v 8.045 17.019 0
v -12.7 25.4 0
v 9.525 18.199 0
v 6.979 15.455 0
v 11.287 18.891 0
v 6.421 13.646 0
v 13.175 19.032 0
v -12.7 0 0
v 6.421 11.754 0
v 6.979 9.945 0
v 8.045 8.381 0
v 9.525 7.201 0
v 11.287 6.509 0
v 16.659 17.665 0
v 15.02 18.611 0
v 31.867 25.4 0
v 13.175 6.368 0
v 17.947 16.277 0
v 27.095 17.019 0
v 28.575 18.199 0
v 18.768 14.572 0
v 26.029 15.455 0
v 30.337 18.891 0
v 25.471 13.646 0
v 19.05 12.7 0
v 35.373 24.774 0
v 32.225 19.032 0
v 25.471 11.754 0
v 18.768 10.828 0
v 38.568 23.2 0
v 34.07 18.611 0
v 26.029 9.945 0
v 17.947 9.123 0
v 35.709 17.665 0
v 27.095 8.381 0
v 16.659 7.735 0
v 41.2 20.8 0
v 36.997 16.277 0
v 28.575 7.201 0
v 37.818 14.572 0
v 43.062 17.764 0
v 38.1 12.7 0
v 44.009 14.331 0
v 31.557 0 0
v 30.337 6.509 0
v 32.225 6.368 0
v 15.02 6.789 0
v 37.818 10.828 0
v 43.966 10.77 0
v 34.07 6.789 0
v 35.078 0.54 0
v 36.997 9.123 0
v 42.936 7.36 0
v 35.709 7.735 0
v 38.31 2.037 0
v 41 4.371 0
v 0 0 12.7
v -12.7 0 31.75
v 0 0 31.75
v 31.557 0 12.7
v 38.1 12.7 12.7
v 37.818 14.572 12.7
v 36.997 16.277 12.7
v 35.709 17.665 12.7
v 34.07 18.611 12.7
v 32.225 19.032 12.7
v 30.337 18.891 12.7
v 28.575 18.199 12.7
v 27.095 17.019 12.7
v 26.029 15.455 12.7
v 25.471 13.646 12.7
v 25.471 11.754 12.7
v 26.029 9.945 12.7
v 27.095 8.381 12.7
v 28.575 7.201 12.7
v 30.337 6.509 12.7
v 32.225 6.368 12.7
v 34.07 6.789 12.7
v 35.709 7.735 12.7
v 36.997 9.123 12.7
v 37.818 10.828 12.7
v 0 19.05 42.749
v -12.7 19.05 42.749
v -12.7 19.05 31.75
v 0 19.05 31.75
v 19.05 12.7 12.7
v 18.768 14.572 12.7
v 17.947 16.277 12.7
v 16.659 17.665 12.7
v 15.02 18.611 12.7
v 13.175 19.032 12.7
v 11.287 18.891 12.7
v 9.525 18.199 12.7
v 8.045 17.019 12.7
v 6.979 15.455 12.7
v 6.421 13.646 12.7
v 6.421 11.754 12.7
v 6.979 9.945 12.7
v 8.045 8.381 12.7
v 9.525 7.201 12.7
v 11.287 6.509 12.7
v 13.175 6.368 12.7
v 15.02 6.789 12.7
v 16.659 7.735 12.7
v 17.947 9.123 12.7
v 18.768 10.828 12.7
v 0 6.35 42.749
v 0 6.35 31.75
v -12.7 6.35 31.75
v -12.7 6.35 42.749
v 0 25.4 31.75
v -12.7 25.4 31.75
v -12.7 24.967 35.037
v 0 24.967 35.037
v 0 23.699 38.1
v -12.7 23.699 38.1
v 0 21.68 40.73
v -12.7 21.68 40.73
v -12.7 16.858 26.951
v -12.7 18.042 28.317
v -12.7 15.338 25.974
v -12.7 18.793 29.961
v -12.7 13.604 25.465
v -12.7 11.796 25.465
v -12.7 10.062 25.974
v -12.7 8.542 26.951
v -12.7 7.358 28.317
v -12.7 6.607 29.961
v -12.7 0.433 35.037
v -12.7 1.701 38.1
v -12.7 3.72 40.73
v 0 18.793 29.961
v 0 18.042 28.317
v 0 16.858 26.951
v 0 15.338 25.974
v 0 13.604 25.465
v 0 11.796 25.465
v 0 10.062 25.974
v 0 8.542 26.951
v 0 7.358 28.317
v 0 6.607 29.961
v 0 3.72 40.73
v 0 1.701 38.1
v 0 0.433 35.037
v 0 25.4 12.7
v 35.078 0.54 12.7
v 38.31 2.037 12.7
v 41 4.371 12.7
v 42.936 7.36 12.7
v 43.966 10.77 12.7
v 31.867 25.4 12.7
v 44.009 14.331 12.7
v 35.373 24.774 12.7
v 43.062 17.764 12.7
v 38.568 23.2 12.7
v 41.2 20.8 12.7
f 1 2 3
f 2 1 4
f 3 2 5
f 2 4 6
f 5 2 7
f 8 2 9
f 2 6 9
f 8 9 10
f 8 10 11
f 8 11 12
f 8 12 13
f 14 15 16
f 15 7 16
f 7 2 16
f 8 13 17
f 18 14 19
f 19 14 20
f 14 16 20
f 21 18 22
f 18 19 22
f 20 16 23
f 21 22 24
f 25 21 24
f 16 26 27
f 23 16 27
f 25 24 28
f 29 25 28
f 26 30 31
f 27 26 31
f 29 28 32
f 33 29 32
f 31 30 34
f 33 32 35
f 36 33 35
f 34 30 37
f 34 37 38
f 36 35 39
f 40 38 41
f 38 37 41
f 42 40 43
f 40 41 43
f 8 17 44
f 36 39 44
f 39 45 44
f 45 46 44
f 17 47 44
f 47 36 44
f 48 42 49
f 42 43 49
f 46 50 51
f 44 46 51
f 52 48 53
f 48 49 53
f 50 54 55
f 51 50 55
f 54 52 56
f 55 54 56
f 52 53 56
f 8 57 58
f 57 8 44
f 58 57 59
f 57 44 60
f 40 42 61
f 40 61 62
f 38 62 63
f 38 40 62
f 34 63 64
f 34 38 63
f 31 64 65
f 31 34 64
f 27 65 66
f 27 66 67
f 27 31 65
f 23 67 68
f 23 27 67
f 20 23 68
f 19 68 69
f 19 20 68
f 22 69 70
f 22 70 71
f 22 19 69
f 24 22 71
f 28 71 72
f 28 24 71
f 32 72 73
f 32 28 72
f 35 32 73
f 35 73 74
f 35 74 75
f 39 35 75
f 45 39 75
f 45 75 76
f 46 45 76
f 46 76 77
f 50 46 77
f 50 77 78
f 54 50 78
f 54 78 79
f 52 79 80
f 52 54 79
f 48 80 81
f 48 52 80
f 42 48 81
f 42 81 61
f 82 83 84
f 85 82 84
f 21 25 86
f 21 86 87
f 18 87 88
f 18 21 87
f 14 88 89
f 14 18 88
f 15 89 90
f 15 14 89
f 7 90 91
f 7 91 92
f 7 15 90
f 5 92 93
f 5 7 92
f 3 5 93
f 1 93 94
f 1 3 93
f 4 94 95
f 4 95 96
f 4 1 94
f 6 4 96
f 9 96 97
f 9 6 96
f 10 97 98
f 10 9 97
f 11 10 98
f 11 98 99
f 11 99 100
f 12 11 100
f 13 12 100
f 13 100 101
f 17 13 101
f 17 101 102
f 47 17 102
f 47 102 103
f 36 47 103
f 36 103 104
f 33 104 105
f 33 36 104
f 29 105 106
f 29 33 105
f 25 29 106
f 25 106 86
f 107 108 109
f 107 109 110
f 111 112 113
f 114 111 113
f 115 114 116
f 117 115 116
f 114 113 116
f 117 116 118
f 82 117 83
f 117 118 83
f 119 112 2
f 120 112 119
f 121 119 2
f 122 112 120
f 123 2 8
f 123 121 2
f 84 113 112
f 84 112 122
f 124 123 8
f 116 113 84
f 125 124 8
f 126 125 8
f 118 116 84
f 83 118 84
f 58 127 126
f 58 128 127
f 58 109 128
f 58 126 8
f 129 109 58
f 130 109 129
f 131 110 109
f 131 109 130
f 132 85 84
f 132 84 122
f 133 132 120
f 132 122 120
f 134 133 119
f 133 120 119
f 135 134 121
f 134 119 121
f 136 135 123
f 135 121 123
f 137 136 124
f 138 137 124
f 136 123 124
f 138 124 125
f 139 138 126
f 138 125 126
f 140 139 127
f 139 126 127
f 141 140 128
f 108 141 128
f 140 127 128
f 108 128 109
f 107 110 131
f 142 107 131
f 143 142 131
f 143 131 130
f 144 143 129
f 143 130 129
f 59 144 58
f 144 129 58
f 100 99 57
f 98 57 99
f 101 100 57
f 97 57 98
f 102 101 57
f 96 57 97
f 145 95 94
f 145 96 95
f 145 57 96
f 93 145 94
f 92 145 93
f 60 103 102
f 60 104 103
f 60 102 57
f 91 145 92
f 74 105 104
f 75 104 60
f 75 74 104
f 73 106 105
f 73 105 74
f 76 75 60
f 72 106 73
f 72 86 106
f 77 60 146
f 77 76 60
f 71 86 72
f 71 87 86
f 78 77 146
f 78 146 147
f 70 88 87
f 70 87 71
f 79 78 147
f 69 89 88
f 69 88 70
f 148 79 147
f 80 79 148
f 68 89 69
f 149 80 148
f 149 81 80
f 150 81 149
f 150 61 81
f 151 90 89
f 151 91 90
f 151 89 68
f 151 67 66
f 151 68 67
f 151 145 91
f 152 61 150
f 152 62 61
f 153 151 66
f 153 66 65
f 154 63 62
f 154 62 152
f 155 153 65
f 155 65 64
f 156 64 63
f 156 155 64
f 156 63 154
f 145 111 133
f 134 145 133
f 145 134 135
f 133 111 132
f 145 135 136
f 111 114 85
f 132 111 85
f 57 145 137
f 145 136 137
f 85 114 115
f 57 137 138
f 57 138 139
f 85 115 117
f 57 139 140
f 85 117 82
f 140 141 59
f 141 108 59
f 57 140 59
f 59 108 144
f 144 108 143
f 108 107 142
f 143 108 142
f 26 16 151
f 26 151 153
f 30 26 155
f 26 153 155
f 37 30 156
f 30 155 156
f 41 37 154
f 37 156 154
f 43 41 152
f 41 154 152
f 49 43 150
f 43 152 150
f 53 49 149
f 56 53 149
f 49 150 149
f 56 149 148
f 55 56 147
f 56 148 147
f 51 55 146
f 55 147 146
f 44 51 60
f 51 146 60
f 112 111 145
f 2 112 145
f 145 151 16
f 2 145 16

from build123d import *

# Parameters (mm, degrees)
F0_R     = 6.35
F1_DEPTH = 12.7
F3_DEPTH = 12.7
F4_W     = 25.4
F4_H     = 31.75
F4_H_2   = 12.7
F5_DEPTH = 12.7
F7_DEPTH = 12.7
F9_DEPTH = 12.7


with BuildPart() as f1:
    # F0 (on Top) → F1 (new body)
    with BuildSketch(Plane.XY):
        with BuildLine():
            Line((31.75, 25.4), (0, 25.4))
            Line((0, 25.4), (0, 0))
            Line((0, 0), (31.75, 0))
            ThreePointArc((31.75, 0), (44.304303, 12.7), (31.75, 25.4))
        make_face()
        with Locations((12.7, 12.7)):
            Circle(F0_R, mode=Mode.SUBTRACT)
        with Locations((31.75, 12.7)):
            Circle(F0_R, mode=Mode.SUBTRACT)
        with BuildLine():
            Line((44.45, 25.4), (31.75, 25.4))
            ThreePointArc((31.75, 25.4), (44.304303, 12.7), (31.75, 0))
            Line((31.75, 0), (44.45, 0))
            Line((44.45, 0), (44.45, 25.4))
        make_face()
    extrude(amount=F1_DEPTH)

    # F2 (on face) → F3 (cut)
    with BuildSketch(Plane.XY.offset(12.7)):
        with BuildLine():
            ThreePointArc((31.866888, 25.4), (44.112876, 12.548889), (31.557373, 0))
            Line((31.557373, 0), (44.45, 0))
            Line((44.45, 0), (44.45, 25.4))
            Line((44.45, 25.4), (31.866888, 25.4))
        make_face()
    extrude(amount=-F3_DEPTH, mode=Mode.SUBTRACT)

    # F4 (on face) → F5 (join)
    with BuildSketch(Plane(origin=(0, 0, 0), x_dir=(0, -1, 0), z_dir=(-1, 0, 0))):
        with Locations((-12.7, 28.575)):
            Rectangle(F4_W, F4_H)
        with Locations((-12.7, 6.35)):
            Rectangle(F4_W, F4_H_2)
    extrude(amount=F5_DEPTH)

    # F6 (on face) → F7 (cut)
    with BuildSketch(Plane(origin=(-12.7, 0, 0), x_dir=(0, -1, 0), z_dir=(-1, 0, 0))):
        with BuildLine():
            Line((-6.35, 44.45), (-19.05, 44.45))
            Line((-19.05, 44.45), (-19.05, 31.75))
            ThreePointArc((-19.05, 31.75), (-12.7, 25.4), (-6.35, 31.75))
            Line((-6.35, 31.75), (-6.35, 44.45))
        make_face()
    extrude(amount=-F7_DEPTH, mode=Mode.SUBTRACT)

    # F8 (on face) → F9 (cut)
    with BuildSketch(Plane(origin=(-12.7, 0, 0), x_dir=(0, -1, 0), z_dir=(-1, 0, 0))):
        with BuildLine():
            ThreePointArc((-25.4, 31.75), (-23.698523, 38.1), (-19.05, 42.748523))
            Line((-19.05, 42.748523), (-19.05, 44.45))
            Line((-19.05, 44.45), (-25.4, 44.45))
            Line((-25.4, 44.45), (-25.4, 31.75))
        make_face()
        with BuildLine():
            ThreePointArc((-6.35, 42.748523), (-1.701477, 38.1), (0, 31.75))
            Line((0, 31.75), (0, 44.45))
            Line((0, 44.45), (-6.35, 44.45))
            Line((-6.35, 44.45), (-6.35, 42.748523))
        make_face()
    extrude(amount=-F9_DEPTH, mode=Mode.SUBTRACT)


solid = f1.part
